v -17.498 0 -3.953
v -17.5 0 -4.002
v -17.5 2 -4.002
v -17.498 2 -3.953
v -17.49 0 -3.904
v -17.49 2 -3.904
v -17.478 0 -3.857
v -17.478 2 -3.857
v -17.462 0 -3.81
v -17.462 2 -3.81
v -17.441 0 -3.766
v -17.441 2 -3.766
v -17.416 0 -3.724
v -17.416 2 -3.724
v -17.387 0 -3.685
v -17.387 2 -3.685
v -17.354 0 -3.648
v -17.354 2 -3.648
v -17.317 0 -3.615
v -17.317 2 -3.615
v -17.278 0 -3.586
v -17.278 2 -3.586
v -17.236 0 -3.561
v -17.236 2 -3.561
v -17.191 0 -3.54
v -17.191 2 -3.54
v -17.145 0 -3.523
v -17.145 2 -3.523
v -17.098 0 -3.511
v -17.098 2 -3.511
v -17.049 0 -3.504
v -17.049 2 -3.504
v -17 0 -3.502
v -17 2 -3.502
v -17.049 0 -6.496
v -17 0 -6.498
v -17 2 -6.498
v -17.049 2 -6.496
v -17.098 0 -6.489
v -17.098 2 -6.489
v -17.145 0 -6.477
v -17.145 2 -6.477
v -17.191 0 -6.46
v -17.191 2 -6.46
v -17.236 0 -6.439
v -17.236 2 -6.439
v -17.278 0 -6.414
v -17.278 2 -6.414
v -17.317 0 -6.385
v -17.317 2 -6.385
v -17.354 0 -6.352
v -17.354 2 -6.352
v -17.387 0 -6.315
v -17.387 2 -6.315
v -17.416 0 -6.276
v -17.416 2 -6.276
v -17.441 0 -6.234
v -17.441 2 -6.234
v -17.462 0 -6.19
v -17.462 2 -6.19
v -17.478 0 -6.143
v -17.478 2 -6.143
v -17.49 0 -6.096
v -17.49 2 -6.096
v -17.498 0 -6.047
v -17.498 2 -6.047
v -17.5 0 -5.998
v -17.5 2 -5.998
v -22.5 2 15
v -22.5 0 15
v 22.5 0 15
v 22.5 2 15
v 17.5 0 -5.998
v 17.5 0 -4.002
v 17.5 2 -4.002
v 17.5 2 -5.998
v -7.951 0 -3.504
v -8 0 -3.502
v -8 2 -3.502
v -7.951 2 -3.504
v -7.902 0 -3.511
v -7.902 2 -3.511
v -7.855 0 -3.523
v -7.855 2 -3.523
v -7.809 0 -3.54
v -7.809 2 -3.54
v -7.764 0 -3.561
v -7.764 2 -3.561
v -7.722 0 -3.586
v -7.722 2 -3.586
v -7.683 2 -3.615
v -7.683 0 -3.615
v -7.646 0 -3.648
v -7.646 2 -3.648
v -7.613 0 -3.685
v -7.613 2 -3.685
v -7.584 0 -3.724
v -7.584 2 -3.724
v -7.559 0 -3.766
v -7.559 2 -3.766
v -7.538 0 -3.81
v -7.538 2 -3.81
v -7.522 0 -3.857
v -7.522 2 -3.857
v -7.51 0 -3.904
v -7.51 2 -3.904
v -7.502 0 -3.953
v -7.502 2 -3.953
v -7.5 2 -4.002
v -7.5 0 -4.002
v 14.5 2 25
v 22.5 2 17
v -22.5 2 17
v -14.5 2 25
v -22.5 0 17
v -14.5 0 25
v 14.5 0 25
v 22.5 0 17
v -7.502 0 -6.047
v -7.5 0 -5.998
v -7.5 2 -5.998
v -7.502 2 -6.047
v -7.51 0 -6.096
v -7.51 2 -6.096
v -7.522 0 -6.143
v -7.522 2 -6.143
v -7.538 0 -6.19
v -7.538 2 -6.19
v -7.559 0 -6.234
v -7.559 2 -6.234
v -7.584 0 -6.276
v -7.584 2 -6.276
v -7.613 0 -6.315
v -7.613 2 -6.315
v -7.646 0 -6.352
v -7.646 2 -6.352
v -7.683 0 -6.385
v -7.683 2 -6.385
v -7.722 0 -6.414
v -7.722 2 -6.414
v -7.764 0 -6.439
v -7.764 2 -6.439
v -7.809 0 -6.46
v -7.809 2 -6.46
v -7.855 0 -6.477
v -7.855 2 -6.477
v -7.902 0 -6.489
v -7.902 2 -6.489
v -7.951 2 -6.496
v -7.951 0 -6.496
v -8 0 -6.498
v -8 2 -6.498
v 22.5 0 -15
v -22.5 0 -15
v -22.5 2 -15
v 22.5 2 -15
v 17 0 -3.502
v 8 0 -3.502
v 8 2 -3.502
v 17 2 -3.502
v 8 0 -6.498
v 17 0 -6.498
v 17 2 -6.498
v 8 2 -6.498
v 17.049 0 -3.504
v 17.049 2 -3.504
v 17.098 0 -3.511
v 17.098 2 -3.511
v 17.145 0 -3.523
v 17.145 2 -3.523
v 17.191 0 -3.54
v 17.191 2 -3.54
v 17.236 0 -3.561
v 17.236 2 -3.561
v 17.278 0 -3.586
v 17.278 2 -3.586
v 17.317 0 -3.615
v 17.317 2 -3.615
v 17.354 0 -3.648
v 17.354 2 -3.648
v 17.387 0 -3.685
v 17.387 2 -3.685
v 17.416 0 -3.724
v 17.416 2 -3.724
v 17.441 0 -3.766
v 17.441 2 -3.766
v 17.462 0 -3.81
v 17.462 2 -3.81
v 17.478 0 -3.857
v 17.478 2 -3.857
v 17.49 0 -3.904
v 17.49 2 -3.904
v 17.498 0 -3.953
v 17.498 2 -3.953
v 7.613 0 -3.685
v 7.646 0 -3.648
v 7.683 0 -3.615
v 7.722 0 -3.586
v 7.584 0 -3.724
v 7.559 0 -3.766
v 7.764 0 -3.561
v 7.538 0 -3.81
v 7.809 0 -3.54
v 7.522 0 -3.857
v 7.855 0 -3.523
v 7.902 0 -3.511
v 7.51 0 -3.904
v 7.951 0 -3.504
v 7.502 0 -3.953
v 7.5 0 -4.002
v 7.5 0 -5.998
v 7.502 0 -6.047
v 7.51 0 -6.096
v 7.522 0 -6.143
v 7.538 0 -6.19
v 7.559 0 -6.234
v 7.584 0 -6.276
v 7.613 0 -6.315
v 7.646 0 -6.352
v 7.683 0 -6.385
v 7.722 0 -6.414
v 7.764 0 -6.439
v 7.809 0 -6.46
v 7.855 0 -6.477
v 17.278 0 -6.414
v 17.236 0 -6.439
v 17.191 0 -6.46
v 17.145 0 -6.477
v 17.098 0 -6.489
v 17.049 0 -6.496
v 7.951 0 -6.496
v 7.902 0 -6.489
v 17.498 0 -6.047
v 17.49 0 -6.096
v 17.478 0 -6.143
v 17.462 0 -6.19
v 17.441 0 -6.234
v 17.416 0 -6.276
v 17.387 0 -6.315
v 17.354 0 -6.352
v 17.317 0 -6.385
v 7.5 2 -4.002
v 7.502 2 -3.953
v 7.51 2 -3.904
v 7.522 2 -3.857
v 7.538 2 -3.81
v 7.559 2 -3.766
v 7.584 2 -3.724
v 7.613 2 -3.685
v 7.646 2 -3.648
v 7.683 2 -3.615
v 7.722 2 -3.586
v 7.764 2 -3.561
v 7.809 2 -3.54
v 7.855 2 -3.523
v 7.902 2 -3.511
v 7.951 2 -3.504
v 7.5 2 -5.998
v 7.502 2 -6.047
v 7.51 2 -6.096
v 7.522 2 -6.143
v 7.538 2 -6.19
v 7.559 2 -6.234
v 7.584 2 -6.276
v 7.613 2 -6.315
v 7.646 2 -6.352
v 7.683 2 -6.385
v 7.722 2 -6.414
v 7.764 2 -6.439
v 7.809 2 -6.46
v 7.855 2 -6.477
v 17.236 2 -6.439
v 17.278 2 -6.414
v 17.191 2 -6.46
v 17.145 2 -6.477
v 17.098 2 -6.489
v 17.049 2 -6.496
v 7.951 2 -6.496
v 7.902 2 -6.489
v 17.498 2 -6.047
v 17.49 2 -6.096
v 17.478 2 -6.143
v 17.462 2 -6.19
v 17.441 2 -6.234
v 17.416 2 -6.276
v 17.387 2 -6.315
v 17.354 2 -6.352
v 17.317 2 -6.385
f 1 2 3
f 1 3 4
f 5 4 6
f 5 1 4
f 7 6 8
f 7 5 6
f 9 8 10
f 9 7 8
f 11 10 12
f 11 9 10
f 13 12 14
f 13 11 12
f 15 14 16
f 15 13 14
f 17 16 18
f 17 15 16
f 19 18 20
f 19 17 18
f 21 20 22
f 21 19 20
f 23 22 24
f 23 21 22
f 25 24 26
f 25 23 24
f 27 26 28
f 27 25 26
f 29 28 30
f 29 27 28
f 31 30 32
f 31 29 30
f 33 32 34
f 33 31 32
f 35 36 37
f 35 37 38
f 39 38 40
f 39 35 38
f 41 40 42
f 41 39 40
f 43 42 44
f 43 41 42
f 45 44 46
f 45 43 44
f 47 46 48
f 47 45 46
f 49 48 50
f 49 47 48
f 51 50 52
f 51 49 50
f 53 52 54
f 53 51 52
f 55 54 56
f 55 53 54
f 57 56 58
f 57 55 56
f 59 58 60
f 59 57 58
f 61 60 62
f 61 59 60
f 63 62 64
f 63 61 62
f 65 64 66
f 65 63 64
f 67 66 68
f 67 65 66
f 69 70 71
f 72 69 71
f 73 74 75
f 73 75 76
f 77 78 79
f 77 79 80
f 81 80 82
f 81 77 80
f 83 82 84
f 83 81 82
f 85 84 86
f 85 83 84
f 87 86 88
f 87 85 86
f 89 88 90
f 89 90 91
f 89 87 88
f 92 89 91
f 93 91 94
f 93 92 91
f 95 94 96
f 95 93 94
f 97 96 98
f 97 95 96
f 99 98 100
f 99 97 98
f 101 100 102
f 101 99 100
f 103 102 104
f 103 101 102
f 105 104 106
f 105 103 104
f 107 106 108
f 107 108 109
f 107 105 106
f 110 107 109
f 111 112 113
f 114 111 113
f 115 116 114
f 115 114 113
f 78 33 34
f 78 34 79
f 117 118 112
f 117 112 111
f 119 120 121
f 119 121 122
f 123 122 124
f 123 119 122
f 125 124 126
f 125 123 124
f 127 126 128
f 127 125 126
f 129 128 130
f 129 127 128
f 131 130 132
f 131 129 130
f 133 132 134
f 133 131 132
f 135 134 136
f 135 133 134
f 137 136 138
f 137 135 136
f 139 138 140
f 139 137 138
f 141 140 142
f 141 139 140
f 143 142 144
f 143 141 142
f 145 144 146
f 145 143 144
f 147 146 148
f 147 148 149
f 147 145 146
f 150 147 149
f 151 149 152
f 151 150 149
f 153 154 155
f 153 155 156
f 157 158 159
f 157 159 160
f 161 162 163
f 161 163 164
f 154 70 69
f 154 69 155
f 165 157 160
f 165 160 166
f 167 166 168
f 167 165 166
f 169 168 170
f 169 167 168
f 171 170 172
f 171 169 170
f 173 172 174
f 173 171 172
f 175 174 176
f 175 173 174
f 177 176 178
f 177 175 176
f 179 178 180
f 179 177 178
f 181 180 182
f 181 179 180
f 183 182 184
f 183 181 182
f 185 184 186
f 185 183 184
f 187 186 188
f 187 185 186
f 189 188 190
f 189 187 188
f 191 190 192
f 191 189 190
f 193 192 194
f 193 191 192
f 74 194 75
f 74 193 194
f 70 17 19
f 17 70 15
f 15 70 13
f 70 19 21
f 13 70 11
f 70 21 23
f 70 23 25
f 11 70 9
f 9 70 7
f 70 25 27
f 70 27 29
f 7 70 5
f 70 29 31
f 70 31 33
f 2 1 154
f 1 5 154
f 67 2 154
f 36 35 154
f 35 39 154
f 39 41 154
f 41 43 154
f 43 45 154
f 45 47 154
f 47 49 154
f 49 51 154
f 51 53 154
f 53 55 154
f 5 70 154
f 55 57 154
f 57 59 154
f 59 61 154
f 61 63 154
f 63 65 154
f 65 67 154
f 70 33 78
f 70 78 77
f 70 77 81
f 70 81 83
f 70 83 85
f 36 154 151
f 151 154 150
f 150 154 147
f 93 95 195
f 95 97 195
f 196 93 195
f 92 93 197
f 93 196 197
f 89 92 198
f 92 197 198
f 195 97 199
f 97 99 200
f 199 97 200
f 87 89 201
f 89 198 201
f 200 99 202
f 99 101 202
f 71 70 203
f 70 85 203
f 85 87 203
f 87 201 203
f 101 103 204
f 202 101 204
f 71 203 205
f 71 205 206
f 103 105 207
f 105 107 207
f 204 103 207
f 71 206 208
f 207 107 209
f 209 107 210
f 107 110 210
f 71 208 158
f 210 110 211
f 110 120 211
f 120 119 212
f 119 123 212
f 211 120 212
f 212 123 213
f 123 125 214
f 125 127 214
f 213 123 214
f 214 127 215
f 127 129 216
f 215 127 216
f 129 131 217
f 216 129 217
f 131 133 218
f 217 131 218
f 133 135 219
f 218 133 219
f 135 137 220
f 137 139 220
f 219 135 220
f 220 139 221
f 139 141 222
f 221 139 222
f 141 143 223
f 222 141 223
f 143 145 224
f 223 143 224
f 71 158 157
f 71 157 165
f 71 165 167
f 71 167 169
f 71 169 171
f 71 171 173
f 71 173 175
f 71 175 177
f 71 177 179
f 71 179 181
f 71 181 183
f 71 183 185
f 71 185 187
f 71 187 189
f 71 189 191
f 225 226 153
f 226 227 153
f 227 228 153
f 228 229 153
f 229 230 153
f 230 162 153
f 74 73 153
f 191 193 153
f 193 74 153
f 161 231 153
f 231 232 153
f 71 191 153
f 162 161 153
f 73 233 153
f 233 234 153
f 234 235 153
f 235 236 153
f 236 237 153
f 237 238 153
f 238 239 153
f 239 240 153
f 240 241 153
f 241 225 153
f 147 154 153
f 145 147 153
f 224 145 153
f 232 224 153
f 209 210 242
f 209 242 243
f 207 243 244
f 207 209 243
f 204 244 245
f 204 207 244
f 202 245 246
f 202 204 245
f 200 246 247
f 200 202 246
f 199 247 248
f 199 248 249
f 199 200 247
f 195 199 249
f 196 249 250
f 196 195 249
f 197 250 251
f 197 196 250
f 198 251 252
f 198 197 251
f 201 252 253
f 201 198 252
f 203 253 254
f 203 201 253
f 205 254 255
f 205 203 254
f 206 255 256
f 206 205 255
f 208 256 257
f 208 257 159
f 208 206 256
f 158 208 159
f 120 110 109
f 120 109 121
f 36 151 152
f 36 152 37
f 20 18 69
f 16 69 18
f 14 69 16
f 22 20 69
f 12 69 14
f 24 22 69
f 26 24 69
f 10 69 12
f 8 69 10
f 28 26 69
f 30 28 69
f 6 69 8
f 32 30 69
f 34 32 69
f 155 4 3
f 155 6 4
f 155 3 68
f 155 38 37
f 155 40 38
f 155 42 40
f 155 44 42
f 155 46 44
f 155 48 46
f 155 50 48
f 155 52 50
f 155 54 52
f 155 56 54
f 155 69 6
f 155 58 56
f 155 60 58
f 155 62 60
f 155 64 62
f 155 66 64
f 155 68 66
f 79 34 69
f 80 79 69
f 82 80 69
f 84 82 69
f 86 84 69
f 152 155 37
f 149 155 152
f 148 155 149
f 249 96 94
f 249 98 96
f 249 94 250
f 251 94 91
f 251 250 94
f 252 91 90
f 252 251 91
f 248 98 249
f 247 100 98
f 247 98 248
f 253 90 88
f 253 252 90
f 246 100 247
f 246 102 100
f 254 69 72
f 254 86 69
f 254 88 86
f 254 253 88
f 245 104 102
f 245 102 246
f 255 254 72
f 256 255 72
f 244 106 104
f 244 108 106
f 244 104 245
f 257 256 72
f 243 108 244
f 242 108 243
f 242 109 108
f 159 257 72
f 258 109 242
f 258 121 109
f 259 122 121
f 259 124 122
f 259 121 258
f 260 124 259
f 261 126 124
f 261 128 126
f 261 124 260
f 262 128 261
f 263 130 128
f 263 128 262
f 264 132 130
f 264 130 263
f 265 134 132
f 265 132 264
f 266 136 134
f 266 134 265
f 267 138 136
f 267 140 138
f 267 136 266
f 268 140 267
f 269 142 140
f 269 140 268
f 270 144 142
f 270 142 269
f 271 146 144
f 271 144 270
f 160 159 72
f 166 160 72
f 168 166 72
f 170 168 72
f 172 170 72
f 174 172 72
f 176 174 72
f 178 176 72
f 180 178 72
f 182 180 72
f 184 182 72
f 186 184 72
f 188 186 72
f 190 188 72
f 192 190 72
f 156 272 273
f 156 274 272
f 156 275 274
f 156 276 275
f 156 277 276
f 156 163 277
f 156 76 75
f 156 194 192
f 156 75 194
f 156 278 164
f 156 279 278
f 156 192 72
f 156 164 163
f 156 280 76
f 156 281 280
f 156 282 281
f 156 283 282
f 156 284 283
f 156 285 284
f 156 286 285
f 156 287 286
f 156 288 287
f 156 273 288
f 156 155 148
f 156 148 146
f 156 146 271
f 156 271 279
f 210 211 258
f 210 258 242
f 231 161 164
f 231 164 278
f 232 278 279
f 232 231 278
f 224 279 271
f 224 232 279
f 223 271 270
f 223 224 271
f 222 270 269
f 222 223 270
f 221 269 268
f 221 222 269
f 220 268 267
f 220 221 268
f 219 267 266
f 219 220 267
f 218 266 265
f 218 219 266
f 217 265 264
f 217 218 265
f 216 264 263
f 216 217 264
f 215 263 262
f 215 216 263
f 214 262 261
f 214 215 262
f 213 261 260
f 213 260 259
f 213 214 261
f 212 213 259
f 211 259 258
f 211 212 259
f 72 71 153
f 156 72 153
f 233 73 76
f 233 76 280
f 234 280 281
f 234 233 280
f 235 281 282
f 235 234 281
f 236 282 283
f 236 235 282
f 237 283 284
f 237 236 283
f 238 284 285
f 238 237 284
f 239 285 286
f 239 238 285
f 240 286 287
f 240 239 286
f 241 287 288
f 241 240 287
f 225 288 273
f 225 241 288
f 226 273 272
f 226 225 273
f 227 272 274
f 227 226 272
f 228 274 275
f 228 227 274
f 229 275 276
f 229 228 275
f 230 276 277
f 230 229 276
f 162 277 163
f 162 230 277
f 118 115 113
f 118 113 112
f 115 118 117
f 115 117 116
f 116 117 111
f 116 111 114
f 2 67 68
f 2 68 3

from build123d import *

# Parameters (mm, degrees)
SKETCH1_W             = 45
SKETCH1_H             = 30
BOSS_EXTRUDE7_DEPTH   = 2
BOSS_EXTRUDE7_2_DEPTH = 2


with BuildPart() as part:
    # Sketch1 → Boss-Extrude7 (new body)
    with BuildSketch(Plane(origin=(0, 0, 0), x_dir=(1, 0, 0), z_dir=(0, 1, 0))):
        Rectangle(SKETCH1_W, SKETCH1_H)
        with BuildLine():
            ThreePointArc((-7.5, 5.998187631), (-7.646446609, 6.351741022), (-8, 6.498187631))
            Line((-8, 6.498187631), (-17, 6.498187631))
            ThreePointArc((-17, 6.498187631), (-17.353553391, 6.351741022), (-17.5, 5.998187631))
            Line((-17.5, 5.998187631), (-17.5, 4.001812369))
            ThreePointArc((-17.5, 4.001812369), (-17.353553391, 3.648258978), (-17, 3.501812369))
            Line((-17, 3.501812369), (-8, 3.501812369))
            ThreePointArc((-8, 3.501812369), (-7.646446609, 3.648258978), (-7.5, 4.001812369))
            Line((-7.5, 4.001812369), (-7.5, 5.998187631))
        make_face(mode=Mode.SUBTRACT)
        with BuildLine():
            Line((7.5, 5.998187631), (7.5, 4.001812369))
            ThreePointArc((7.5, 4.001812369), (7.646446609, 3.648258978), (8, 3.501812369))
            Line((8, 3.501812369), (17, 3.501812369))
            ThreePointArc((17, 3.501812369), (17.353553391, 3.648258978), (17.5, 4.001812369))
            Line((17.5, 4.001812369), (17.5, 5.998187631))
            ThreePointArc((17.5, 5.998187631), (17.353553391, 6.351741022), (17, 6.498187631))
            Line((17, 6.498187631), (8, 6.498187631))
            ThreePointArc((8, 6.498187631), (7.646446609, 6.351741022), (7.5, 5.998187631))
        make_face(mode=Mode.SUBTRACT)
    extrude(amount=BOSS_EXTRUDE7_DEPTH)


with BuildPart() as body_2:
    # Sketch1 → Boss-Extrude7 2 (new body)
    with BuildSketch(Plane(origin=(0, 0, 0), x_dir=(1, 0, 0), z_dir=(0, 1, 0))):
        Polygon((22.5, -17), (14.5, -25), (-14.5, -25), (-22.5, -17), align=None)
    extrude(amount=BOSS_EXTRUDE7_2_DEPTH)


solid = Compound([part.part, body_2.part])
